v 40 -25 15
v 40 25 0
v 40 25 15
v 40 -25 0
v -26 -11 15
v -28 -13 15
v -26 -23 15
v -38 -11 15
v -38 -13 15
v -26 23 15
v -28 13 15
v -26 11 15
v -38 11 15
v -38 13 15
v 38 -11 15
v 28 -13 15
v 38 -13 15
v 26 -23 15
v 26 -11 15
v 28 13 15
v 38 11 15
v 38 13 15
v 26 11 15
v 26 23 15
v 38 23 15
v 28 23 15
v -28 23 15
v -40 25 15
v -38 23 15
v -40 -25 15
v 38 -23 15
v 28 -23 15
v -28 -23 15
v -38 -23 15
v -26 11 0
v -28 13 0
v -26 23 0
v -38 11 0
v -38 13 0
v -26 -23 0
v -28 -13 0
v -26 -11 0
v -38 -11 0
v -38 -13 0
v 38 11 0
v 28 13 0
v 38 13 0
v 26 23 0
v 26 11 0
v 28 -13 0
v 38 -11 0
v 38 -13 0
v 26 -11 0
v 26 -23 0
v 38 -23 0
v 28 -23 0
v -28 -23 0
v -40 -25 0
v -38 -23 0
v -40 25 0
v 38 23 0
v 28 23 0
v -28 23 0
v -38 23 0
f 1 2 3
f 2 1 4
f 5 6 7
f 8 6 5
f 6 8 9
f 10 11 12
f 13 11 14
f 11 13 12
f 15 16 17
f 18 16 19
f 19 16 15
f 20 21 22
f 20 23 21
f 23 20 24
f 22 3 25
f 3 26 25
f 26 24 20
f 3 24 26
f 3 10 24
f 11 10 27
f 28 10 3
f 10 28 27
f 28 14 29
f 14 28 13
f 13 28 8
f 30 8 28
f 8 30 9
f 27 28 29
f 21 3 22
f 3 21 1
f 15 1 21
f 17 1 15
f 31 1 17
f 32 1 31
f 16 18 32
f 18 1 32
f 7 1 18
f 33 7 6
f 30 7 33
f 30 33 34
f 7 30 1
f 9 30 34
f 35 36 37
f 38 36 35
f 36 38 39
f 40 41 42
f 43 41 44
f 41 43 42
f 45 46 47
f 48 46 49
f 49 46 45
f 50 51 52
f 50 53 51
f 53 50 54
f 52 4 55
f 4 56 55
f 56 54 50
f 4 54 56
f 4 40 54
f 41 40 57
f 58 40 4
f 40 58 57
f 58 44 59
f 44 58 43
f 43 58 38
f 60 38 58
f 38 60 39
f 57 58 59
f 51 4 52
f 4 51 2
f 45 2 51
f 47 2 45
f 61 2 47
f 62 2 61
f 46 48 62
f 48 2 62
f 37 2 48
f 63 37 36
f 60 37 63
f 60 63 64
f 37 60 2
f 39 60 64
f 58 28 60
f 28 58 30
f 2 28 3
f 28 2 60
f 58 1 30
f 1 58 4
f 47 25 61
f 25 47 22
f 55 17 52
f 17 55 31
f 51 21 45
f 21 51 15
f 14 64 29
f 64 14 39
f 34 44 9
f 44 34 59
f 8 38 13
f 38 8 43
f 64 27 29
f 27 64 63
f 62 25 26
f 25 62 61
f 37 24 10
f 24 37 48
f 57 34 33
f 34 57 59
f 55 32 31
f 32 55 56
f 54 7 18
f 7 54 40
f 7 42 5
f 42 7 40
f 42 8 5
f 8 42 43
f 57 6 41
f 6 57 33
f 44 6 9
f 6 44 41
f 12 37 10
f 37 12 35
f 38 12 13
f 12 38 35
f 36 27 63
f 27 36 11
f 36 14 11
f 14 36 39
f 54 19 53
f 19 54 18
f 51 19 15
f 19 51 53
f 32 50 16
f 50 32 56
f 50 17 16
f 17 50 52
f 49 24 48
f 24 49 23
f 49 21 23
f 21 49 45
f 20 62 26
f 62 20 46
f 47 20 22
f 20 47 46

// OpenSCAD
// euro platine pcb framing by zeus - zeus@ctdo.de - 2014-11-20
// 160x100mm is 1 full-sized euro platine
//  80x100mm is 1 half-sized euro platine
//  80x50mm  is 1 quarter-sized euro platine

// =====================================

// height
h=15; // [1:200]
// length
l=80; // [1:200]
// width
b=50; // [1:200]
// material thickness
mt=2; // [1:200]
// standoff spacing (10mm is good for m3 and m4 standoffs)
spare=10; // [1:200]

// =====================================

translate([0,0,h/2]){
	difference(){
		cube([l,b,h],center=true);
		cube([l-mt*2,b-mt*2,h+1],center=true);
	}
	for(x=[-l/2+spare/2+mt,l/2-spare/2-mt],y=[-b/2+spare/2+mt,b/2-spare/2-mt]){
		translate([x,y,0]){
			difference(){
				cube([spare+mt*2,spare+mt*2,h],center=true);
				cube([spare,spare,h+1],center=true);
			}
		}
	}
}
